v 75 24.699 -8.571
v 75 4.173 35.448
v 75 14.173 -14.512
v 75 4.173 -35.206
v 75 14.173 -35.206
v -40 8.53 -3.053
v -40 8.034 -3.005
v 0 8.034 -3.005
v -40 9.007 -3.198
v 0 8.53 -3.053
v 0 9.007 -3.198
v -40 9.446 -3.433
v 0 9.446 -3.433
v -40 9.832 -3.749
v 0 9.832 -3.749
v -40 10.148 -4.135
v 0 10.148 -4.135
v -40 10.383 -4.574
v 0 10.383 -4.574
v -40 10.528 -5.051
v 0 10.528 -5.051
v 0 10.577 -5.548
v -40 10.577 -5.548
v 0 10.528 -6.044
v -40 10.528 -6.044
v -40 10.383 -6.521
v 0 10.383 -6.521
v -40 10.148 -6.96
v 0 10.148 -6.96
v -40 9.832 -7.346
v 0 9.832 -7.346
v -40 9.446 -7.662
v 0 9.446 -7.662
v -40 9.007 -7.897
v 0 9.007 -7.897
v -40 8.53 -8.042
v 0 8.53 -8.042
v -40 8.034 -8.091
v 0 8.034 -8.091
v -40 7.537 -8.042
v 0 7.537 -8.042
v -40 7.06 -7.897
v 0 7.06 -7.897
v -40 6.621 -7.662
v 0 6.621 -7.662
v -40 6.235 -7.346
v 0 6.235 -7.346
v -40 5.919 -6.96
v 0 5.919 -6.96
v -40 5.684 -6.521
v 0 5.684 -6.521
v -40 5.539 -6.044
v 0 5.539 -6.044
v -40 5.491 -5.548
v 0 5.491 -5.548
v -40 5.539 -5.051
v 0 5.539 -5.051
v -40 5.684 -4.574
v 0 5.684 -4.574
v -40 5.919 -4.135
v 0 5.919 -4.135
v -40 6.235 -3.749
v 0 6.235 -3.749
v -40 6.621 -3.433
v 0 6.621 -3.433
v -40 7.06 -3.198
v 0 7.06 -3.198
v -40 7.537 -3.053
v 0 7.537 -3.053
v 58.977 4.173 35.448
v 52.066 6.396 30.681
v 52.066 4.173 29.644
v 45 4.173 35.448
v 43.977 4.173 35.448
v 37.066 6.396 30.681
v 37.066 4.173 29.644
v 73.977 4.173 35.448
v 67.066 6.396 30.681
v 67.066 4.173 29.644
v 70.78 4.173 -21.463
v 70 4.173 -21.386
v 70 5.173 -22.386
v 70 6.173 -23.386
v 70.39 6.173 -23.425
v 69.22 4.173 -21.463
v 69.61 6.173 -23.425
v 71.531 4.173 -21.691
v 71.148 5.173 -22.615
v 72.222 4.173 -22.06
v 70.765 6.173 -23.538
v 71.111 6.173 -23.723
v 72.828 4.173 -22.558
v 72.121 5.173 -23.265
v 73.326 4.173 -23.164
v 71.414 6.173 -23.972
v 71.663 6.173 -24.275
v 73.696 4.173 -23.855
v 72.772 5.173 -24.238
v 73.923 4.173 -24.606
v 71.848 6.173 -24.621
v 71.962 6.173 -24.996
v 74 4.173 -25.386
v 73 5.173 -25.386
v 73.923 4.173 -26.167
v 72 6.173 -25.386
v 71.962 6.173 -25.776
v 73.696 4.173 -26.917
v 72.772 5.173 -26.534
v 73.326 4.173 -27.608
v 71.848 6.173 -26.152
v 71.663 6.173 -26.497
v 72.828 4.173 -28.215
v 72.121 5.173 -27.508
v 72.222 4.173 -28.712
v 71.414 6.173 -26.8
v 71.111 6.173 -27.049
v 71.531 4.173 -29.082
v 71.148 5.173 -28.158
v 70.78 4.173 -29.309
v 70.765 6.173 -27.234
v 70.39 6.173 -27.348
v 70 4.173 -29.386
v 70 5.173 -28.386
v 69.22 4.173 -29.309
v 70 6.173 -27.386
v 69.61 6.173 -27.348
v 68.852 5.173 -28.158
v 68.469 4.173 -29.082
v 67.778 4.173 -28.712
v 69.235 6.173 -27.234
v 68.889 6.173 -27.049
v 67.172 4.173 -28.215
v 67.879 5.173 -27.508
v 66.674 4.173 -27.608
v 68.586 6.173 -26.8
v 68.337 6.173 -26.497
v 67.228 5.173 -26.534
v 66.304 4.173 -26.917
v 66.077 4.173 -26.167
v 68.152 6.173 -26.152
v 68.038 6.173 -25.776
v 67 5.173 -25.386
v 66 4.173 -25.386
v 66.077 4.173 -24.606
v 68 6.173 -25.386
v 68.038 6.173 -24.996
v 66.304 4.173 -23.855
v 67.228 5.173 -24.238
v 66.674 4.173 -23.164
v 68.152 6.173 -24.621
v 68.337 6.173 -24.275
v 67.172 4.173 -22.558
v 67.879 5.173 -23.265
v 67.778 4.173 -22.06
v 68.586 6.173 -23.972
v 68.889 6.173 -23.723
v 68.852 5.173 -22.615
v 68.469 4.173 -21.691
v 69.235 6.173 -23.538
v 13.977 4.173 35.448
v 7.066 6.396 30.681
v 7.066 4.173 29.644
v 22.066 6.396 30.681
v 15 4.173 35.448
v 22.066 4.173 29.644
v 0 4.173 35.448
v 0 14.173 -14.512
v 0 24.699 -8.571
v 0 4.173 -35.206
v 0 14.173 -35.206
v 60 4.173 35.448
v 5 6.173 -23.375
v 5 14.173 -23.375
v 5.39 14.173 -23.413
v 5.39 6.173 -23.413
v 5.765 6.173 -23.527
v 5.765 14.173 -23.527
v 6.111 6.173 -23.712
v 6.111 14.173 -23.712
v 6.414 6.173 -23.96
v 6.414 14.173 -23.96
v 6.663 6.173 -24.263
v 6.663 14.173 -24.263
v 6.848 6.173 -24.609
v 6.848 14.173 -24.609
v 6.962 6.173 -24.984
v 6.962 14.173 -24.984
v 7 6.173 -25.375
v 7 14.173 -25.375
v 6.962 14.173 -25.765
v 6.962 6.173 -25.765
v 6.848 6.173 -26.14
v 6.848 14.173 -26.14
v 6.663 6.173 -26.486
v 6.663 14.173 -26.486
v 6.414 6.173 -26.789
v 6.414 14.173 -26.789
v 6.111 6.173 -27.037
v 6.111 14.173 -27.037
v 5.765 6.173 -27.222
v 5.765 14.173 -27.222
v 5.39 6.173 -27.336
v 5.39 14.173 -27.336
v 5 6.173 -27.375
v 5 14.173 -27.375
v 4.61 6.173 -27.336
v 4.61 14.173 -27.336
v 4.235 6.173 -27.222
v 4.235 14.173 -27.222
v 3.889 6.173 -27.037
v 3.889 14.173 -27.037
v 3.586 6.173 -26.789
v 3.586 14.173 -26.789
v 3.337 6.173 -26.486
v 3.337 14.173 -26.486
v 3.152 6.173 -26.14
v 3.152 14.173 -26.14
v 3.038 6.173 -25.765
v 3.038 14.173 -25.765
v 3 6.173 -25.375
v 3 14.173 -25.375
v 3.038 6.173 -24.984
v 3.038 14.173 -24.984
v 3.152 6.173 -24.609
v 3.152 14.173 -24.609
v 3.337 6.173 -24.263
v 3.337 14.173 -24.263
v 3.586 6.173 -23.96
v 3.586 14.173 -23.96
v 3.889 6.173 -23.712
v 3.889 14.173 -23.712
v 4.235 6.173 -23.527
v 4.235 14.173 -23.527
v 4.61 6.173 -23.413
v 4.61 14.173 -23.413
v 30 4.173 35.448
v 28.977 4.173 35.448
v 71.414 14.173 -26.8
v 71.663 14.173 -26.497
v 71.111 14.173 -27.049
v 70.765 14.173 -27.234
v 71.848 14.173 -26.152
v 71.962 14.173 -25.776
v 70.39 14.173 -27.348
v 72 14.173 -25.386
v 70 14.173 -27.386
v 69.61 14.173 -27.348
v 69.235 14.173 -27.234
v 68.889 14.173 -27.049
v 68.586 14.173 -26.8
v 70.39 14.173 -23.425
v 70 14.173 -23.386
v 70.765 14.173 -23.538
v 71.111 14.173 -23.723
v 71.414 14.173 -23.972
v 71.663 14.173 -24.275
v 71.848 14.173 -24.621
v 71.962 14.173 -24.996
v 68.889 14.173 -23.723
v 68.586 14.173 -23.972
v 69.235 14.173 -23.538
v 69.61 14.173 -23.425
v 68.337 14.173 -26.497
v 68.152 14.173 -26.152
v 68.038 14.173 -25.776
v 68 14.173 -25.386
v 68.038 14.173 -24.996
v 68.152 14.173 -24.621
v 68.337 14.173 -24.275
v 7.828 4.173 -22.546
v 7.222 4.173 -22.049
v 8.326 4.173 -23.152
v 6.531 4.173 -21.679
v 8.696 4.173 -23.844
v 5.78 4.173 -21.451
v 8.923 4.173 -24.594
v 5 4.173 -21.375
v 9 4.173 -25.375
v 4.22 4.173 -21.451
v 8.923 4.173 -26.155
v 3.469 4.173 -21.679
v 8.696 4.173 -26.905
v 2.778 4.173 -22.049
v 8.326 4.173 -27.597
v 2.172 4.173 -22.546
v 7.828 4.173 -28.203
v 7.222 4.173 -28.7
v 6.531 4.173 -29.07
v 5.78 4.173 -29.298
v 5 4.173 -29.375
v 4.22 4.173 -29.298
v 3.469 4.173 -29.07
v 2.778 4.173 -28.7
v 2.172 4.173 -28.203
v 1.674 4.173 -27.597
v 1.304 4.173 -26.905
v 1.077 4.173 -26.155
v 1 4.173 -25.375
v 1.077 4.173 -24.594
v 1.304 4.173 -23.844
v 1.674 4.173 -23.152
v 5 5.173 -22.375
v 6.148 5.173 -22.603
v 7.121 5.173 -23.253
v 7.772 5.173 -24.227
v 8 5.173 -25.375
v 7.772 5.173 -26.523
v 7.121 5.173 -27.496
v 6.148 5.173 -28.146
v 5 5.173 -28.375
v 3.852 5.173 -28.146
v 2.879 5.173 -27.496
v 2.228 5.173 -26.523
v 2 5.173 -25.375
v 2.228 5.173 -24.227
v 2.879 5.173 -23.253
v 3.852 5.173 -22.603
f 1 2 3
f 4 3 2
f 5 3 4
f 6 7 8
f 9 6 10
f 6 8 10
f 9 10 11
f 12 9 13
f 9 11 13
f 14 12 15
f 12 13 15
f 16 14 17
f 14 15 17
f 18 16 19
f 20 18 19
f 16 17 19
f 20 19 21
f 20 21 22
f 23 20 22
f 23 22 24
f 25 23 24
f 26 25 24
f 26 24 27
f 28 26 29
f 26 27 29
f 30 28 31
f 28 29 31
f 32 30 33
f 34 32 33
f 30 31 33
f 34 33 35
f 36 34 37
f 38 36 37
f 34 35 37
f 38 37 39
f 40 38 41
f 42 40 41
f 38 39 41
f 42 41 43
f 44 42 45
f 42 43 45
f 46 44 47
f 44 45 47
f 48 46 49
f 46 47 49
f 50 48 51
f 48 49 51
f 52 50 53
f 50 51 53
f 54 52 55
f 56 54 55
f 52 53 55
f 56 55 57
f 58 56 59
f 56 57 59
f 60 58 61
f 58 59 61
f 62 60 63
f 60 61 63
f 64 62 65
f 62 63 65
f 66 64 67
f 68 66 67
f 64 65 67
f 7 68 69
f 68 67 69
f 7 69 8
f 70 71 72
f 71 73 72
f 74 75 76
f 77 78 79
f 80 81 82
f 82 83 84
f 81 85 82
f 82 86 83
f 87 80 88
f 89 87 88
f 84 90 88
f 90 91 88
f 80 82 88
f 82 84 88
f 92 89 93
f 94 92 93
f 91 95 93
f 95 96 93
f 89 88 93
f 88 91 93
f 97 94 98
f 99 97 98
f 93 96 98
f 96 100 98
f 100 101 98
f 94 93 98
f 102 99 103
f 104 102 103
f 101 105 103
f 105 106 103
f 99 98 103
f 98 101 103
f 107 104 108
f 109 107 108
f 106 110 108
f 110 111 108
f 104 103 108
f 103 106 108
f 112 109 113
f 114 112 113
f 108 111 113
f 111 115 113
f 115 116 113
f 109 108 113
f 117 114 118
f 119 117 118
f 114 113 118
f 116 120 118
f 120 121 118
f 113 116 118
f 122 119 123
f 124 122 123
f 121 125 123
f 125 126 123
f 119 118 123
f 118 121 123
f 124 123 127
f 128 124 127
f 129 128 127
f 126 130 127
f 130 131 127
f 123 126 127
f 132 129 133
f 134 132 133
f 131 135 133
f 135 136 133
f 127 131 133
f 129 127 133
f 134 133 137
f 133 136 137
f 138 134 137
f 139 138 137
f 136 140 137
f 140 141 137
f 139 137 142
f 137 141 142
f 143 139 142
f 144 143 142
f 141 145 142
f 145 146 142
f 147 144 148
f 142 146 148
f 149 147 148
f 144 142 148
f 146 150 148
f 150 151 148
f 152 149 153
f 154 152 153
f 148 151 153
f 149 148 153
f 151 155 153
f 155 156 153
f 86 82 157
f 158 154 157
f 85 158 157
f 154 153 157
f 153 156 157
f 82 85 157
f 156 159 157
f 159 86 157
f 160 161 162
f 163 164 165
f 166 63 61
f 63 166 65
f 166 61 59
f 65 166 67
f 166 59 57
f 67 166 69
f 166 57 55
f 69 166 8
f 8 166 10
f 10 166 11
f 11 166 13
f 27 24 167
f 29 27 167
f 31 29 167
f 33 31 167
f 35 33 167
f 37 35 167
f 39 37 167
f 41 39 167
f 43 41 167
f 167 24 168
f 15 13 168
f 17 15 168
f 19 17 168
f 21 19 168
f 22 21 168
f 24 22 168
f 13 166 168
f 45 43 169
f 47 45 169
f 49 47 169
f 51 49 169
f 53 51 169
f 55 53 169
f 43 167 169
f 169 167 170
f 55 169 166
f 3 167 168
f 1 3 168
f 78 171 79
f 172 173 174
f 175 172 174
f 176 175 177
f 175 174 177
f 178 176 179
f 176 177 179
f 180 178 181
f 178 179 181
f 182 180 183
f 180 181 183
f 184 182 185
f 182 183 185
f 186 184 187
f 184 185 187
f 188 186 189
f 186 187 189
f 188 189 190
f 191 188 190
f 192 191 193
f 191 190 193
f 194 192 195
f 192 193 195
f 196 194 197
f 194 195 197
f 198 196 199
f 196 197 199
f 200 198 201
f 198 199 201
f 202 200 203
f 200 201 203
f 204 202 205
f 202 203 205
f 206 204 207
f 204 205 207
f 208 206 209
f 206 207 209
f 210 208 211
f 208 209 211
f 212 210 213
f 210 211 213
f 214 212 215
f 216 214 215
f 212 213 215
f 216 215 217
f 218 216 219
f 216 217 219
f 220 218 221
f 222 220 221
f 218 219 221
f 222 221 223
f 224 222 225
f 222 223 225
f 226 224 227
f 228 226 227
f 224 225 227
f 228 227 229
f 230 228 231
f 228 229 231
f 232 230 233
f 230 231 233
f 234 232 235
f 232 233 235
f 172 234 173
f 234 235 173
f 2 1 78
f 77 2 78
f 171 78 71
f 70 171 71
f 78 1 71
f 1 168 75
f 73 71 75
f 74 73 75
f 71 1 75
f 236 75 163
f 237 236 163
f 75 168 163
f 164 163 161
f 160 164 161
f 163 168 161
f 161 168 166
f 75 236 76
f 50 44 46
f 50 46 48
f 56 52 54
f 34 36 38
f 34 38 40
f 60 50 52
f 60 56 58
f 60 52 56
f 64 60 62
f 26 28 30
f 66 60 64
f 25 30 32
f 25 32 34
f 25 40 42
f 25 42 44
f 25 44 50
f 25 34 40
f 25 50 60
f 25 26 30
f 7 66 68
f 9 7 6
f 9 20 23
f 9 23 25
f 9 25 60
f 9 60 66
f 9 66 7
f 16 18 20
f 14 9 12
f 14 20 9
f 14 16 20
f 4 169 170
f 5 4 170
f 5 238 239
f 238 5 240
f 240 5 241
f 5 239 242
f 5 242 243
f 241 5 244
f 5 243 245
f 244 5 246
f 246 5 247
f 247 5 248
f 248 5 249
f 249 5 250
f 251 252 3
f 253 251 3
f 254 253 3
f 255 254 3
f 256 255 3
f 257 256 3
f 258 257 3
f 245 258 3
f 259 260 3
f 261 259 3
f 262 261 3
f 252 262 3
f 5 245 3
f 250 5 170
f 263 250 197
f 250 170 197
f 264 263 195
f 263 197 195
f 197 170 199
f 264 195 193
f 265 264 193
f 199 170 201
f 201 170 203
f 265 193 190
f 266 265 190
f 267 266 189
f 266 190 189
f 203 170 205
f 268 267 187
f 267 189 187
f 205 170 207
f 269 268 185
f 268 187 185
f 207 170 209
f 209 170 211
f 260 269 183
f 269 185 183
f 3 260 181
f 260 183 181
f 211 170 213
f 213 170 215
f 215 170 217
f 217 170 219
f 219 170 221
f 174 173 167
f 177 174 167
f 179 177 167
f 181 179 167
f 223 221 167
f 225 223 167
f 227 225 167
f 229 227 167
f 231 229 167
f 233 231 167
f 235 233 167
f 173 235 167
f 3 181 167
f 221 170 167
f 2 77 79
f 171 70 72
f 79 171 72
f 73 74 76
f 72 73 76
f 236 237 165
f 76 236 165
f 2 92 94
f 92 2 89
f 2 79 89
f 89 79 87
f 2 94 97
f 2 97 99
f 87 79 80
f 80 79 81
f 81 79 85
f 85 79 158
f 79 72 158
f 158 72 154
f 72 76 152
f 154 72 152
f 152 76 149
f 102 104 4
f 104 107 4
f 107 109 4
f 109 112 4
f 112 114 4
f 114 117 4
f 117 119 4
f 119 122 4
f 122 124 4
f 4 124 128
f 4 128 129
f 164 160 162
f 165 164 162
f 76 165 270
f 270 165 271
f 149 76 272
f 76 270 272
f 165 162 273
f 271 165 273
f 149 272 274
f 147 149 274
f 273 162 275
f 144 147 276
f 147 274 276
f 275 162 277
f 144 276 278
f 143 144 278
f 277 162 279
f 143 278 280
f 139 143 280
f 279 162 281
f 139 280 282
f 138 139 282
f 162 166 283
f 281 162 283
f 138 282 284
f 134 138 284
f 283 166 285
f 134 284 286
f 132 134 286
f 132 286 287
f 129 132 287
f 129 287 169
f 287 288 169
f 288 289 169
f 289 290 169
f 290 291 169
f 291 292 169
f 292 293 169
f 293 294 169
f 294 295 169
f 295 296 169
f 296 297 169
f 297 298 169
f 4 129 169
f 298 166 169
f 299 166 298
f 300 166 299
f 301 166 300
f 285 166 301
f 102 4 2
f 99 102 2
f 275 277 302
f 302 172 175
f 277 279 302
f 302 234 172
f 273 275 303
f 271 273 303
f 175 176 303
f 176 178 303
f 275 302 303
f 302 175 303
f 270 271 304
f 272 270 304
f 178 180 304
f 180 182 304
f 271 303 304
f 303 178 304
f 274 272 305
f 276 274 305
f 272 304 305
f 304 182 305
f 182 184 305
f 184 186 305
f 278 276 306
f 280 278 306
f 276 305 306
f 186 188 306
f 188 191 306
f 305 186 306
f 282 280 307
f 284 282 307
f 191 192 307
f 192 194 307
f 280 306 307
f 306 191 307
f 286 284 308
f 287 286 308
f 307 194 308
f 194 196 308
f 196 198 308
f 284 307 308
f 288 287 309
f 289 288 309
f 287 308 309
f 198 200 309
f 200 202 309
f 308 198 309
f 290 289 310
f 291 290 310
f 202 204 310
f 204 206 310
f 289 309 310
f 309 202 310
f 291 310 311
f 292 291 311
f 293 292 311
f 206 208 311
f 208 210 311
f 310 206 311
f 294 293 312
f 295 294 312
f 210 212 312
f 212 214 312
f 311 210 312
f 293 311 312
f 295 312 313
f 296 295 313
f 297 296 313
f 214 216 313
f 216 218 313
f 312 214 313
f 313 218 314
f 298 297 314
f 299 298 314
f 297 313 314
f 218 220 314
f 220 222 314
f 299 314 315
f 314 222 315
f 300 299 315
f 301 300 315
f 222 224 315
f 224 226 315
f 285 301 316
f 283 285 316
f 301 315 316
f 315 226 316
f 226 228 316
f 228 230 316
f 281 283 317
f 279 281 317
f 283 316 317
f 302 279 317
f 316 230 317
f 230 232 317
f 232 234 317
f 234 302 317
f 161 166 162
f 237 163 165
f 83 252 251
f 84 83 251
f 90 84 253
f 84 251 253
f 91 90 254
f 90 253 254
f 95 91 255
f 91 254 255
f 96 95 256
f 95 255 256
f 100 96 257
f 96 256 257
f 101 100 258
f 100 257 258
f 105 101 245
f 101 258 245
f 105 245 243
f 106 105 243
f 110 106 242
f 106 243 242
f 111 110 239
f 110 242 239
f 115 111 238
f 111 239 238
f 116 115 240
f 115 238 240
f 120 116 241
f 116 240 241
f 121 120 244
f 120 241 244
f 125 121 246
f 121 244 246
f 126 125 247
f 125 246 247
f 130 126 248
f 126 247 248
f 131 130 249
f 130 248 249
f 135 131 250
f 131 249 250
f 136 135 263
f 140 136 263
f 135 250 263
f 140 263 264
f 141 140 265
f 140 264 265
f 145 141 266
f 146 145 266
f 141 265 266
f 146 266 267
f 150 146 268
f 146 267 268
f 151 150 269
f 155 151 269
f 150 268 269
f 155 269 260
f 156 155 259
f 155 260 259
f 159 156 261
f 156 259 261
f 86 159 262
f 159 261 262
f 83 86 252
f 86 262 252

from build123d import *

# Parameters (mm, degrees)
BOSS_EXTRUDE1_DEPTH = 75
SKETCH2_R           = 2
CUT_EXTRUDE1_DEPTH  = 10
CUT_EXTRUDE2_DEPTH  = 10
CHAMFER1_SIZE       = 2
SKETCH3_R           = 2.543008444
BOSS_EXTRUDE2_DEPTH = 40


with BuildPart() as part:
    # Sketch1 → Boss-Extrude1 (new body)
    with BuildSketch(Plane(origin=(0, 0, 0), x_dir=(0, 0, -1), z_dir=(1, 0, 0))):
        Polygon((-35.447605249, 4.173188871), (35.206481481, 4.173188871), (35.206481481, 14.173188871), (14.511910864, 14.173188871), (8.571096195, 24.699446456), align=None)
    extrude(amount=BOSS_EXTRUDE1_DEPTH)

    # Sketch2 → Cut-Extrude1 (cut)
    with BuildSketch(Plane(origin=(0, 14.173188871, 0), x_dir=(1, 0, 0), z_dir=(0, 1, 0))):
        with Locations(Location((5, 25.374559272, 0), (0, 0, 270))):
            Circle(SKETCH2_R)
        with Locations(Location((69.999998955, 25.38621548, 0), (0, 0, 270))):
            Circle(SKETCH2_R)
    extrude(amount=-CUT_EXTRUDE1_DEPTH, mode=Mode.SUBTRACT)

    # Sketch4 → Cut-Extrude2 (cut)
    with BuildSketch(Plane(origin=(0, 17.005051997, 7.929585973), x_dir=(1, 0, 0), z_dir=(0, 0.9063077870366527, 0.4226182617406937))):
        Polygon((0, -30.362774842), (7.065850082, -25.103103439), (13.976560291, -30.362774842), align=None)
        Polygon((22.065850082, -25.103103439), (28.976560291, -30.362774842), (15, -30.362774842), align=None)
        Polygon((37.065850082, -25.103103439), (43.976560291, -30.362774842), (30, -30.362774842), align=None)
        Polygon((52.065850082, -25.103103439), (58.976560291, -30.362774842), (45, -30.362774842), align=None)
        Polygon((67.065850082, -25.103103439), (73.976560291, -30.362774842), (60, -30.362774842), align=None)
    extrude(amount=-CUT_EXTRUDE2_DEPTH, mode=Mode.SUBTRACT)

    # Chamfer1
    chamfer1_edges = [part.edges().sort_by_distance(p)[0] for p in [
        (5, 4.173188871, -27.374559272),
        (69.999998955, 4.173188871, -27.38621548),
    ]]
    chamfer(chamfer1_edges, length=CHAMFER1_SIZE)

    # Sketch3 → Boss-Extrude2 (add)
    with BuildSketch(Plane.ZY):
        with Locations((-5.547587106, 8.033515635)):
            Circle(SKETCH3_R)
    extrude(amount=BOSS_EXTRUDE2_DEPTH)


solid = part.part
